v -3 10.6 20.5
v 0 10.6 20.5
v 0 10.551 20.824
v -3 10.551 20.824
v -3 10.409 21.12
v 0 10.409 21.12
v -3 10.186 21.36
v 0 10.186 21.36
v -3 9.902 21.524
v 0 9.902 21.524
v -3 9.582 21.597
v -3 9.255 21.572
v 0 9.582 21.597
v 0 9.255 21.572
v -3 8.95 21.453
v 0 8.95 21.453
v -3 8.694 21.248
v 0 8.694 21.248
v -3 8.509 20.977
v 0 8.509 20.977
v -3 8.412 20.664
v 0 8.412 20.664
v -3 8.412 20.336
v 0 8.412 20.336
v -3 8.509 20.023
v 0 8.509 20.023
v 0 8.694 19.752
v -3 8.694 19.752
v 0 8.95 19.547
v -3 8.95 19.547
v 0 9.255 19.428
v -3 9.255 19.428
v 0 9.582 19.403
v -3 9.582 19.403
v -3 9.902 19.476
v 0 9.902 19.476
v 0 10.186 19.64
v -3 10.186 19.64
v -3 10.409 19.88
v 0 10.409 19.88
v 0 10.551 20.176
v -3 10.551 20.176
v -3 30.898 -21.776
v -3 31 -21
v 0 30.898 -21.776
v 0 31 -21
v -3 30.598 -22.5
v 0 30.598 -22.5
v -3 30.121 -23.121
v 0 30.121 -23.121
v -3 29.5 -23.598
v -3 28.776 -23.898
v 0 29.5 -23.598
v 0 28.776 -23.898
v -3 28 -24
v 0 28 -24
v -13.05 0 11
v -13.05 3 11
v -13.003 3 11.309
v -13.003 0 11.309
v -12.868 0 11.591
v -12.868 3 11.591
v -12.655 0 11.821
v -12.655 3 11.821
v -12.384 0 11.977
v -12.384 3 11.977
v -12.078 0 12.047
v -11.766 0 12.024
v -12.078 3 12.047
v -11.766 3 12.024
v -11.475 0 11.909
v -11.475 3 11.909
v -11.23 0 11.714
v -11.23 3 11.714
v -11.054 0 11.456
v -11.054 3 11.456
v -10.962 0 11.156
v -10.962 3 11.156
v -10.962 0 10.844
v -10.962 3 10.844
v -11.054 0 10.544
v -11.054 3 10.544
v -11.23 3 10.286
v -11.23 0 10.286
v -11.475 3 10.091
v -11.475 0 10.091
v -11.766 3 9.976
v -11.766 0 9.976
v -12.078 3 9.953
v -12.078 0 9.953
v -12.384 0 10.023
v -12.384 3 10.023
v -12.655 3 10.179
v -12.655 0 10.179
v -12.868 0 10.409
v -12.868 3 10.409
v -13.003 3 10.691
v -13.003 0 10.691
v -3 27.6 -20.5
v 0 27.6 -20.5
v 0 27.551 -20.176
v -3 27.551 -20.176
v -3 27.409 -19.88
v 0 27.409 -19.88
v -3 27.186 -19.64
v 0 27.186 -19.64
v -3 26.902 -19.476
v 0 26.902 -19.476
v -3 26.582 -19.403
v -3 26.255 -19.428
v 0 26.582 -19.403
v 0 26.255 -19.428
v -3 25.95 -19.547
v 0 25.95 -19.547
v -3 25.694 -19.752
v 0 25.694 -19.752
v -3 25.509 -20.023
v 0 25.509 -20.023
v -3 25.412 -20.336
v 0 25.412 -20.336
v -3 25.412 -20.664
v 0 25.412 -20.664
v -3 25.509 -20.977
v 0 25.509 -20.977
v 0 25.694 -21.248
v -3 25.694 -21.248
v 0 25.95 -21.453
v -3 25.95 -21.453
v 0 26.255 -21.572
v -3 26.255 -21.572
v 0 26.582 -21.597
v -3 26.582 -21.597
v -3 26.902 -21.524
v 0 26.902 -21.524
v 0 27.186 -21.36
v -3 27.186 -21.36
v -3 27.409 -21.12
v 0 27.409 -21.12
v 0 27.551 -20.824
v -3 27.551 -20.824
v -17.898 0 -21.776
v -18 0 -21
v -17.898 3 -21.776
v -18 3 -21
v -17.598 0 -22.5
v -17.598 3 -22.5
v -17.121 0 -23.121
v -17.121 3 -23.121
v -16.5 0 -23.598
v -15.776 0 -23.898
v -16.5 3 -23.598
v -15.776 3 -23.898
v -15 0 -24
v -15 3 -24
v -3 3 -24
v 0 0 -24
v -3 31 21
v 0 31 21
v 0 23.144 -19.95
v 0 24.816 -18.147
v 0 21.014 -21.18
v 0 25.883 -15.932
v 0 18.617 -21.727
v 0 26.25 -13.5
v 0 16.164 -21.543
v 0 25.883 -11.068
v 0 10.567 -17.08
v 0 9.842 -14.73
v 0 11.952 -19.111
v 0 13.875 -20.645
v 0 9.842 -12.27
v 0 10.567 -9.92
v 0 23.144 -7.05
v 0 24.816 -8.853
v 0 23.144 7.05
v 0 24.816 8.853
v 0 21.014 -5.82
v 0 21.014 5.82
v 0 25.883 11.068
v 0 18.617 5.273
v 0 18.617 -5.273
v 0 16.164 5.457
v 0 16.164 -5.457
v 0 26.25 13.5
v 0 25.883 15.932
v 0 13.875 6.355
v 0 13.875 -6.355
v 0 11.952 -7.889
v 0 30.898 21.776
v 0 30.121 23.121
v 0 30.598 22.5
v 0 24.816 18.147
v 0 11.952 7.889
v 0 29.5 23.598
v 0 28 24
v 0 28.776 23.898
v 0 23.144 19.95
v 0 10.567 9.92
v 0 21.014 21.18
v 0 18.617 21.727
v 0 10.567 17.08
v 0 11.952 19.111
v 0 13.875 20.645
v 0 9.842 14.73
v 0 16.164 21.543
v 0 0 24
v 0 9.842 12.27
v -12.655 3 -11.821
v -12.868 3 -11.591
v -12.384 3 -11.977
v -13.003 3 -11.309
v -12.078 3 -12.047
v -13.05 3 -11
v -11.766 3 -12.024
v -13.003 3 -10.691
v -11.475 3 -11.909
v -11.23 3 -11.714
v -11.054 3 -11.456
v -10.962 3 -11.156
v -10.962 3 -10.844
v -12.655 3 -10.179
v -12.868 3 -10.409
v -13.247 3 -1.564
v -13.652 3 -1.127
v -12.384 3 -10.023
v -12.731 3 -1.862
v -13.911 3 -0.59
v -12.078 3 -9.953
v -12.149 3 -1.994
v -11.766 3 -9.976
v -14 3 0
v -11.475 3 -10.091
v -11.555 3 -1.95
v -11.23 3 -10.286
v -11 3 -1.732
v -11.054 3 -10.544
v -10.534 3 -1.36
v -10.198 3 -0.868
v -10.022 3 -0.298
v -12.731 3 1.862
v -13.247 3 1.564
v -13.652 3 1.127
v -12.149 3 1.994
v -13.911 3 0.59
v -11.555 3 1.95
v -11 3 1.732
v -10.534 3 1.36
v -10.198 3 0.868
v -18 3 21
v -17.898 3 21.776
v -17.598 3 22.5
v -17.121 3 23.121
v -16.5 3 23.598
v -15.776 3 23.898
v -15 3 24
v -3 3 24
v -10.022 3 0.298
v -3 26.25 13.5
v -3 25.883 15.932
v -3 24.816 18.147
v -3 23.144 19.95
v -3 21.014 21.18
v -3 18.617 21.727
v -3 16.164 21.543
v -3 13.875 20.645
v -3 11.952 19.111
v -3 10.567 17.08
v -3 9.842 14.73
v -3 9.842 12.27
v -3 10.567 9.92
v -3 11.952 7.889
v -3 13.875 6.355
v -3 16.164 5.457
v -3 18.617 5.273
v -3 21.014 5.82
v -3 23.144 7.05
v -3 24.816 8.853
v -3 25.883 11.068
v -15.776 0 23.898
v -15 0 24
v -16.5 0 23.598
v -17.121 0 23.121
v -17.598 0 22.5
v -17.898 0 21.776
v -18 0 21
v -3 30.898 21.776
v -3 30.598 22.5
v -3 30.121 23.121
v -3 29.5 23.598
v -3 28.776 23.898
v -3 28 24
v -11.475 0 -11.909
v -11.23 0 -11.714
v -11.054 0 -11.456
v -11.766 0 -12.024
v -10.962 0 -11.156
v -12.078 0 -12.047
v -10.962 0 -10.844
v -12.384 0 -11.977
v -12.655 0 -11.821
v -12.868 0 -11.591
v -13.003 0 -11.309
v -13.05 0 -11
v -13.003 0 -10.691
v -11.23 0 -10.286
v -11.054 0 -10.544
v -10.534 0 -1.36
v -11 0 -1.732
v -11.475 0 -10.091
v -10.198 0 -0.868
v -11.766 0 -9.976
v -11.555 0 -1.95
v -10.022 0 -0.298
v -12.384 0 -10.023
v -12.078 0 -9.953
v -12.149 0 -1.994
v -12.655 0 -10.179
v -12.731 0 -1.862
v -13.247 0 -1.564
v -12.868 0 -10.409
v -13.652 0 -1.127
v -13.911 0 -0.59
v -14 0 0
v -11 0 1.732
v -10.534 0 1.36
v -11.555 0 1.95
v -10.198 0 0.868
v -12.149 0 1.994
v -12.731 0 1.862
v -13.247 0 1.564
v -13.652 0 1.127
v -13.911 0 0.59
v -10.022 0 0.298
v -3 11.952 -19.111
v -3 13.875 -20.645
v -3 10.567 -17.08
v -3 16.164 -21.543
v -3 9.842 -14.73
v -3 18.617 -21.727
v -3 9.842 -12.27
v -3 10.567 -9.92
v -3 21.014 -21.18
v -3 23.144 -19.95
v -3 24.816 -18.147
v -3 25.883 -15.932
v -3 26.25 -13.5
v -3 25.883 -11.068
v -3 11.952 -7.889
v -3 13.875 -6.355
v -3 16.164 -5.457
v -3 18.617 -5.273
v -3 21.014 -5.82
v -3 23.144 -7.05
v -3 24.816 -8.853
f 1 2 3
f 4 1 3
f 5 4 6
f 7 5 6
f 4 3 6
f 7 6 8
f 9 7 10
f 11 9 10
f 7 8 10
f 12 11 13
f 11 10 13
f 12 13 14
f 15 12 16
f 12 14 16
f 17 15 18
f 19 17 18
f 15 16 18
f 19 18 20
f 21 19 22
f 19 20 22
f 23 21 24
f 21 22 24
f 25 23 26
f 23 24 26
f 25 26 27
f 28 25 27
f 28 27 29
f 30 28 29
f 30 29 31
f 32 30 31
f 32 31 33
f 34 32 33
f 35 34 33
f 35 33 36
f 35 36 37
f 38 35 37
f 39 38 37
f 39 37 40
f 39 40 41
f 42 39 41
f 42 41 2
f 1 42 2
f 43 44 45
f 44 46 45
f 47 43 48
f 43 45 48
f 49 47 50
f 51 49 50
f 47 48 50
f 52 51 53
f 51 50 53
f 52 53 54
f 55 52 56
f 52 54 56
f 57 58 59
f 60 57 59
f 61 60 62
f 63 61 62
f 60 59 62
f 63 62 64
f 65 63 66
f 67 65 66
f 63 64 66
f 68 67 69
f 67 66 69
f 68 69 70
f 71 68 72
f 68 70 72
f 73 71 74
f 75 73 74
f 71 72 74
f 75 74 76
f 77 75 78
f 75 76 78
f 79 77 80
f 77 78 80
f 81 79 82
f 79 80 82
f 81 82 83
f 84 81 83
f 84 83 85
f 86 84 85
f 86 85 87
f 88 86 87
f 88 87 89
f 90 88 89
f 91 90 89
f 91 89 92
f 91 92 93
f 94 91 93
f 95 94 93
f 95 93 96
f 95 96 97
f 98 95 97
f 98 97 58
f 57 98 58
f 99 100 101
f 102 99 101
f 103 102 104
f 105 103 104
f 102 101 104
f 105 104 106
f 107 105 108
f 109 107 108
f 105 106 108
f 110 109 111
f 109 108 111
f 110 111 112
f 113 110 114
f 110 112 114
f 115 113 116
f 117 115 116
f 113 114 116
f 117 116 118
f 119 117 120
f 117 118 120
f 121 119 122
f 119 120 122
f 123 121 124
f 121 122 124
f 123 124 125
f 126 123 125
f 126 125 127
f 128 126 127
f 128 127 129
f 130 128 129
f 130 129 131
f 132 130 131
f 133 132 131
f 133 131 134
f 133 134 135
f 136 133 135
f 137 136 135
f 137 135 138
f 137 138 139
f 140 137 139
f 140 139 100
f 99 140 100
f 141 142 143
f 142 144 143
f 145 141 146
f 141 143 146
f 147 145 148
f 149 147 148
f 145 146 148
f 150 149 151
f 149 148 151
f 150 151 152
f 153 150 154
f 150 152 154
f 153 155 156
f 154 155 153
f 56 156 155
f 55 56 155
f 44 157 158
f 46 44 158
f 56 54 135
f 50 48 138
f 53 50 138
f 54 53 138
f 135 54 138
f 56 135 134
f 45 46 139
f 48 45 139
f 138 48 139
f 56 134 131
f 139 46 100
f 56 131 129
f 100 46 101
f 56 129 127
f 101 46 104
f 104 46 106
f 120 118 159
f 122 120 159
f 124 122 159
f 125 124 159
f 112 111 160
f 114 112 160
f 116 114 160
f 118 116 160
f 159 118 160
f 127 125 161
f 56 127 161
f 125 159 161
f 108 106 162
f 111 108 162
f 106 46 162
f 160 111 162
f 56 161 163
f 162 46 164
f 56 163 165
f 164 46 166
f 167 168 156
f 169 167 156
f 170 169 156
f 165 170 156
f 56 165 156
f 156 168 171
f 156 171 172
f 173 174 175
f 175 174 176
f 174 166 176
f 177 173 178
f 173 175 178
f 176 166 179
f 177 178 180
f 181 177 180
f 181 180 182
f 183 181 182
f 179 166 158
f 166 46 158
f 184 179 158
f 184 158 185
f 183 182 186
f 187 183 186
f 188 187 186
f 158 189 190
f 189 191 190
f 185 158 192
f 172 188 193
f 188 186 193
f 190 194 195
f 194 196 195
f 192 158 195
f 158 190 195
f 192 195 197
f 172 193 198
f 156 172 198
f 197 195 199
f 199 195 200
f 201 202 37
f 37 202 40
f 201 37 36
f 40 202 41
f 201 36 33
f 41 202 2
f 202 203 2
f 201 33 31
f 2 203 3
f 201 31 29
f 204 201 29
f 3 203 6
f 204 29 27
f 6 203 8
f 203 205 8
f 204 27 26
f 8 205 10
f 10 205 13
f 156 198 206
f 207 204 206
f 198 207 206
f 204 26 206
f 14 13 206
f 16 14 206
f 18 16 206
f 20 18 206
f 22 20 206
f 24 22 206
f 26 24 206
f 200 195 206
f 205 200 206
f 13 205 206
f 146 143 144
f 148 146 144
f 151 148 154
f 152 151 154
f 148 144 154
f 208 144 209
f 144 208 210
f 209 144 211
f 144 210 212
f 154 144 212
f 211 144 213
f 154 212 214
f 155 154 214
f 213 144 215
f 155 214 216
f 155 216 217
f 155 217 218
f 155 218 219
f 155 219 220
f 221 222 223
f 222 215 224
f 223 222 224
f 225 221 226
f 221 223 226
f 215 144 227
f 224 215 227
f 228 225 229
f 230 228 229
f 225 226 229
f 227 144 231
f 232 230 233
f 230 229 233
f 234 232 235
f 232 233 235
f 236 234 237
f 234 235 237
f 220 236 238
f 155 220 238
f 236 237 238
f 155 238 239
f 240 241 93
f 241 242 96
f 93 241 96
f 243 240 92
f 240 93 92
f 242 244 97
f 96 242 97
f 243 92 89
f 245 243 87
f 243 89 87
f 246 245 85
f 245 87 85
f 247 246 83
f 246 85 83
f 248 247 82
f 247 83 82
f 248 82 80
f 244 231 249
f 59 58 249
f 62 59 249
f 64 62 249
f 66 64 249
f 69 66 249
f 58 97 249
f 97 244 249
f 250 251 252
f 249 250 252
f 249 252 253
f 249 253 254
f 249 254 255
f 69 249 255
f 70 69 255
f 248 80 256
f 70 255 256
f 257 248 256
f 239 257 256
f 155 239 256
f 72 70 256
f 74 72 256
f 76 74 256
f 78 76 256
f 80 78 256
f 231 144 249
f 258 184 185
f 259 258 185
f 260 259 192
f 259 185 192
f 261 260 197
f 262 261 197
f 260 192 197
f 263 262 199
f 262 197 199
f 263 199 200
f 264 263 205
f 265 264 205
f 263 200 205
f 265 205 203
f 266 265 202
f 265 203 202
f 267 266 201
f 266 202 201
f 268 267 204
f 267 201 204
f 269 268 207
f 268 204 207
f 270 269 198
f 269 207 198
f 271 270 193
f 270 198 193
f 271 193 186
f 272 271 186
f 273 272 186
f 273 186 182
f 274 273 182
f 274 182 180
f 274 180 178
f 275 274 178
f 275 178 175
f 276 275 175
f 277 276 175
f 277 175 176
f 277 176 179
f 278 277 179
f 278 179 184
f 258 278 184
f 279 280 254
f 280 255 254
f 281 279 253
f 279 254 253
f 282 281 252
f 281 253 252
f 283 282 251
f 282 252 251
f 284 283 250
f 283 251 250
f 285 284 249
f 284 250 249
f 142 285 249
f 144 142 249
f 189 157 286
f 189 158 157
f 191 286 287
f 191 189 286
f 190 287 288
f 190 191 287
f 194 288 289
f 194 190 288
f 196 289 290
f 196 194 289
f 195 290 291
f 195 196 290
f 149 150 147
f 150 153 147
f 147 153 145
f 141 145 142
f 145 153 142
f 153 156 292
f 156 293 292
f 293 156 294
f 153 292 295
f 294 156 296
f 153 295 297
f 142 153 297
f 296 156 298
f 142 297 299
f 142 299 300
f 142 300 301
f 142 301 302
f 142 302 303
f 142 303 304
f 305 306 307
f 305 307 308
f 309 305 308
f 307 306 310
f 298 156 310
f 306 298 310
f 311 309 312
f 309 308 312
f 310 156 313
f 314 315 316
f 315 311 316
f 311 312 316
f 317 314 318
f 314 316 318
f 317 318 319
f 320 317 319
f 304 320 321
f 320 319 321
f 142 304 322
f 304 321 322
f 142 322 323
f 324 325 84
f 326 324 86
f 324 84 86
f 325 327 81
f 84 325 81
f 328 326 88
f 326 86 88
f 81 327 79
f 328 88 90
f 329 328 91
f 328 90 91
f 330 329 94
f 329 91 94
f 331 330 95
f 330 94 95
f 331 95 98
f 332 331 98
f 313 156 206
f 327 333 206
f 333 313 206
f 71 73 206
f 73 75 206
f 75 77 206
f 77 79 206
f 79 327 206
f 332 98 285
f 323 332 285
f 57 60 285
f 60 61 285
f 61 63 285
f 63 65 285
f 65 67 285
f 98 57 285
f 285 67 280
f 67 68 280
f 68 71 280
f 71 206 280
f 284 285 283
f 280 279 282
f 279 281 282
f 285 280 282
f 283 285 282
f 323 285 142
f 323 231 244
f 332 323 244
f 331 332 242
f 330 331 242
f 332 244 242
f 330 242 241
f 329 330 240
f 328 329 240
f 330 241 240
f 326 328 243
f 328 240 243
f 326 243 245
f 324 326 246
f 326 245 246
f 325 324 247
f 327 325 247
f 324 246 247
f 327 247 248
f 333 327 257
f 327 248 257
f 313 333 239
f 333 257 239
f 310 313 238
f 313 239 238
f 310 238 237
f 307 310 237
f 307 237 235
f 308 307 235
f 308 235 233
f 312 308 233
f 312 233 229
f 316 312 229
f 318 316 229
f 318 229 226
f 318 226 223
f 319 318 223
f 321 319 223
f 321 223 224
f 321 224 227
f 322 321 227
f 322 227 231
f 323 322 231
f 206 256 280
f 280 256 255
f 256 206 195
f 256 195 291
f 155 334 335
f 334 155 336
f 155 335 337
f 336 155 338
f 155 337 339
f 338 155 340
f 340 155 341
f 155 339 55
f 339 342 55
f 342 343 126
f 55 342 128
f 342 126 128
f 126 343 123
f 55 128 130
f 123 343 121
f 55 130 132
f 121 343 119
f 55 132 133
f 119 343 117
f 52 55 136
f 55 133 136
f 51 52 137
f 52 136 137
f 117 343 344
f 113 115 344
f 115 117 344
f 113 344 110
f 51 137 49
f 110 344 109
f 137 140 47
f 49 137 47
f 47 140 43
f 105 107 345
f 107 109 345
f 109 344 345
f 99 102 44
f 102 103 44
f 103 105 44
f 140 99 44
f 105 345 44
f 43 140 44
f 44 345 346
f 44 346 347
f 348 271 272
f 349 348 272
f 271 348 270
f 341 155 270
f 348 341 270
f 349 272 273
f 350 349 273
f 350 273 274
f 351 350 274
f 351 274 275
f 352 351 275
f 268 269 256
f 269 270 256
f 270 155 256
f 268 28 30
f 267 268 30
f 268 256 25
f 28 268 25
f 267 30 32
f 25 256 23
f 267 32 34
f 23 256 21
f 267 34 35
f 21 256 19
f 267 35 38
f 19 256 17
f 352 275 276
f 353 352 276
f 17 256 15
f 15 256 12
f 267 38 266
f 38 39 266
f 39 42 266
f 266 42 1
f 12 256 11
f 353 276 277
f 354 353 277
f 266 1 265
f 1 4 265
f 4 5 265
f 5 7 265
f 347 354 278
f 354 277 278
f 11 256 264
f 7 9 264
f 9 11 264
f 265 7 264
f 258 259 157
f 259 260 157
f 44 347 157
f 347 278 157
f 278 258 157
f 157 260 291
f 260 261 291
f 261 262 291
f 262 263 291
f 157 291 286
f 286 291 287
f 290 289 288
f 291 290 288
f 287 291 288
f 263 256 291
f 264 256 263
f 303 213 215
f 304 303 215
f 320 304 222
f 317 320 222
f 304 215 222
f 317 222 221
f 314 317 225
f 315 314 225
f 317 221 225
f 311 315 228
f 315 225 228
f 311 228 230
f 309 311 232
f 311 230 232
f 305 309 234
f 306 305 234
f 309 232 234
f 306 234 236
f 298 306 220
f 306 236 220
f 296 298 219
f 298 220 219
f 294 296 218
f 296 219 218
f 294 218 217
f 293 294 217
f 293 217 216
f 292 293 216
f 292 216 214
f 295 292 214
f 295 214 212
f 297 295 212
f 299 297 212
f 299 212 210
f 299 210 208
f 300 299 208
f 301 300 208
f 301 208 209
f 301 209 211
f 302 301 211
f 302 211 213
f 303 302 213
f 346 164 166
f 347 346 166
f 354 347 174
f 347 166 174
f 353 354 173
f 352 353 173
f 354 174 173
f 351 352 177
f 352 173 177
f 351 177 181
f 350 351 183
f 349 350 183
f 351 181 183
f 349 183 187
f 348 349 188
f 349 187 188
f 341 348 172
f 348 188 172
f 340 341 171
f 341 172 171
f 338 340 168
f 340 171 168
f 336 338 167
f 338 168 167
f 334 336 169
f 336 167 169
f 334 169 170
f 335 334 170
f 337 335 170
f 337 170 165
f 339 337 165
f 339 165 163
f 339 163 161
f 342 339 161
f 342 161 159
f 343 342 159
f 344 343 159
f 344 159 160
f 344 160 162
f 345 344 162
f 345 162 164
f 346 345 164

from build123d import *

# Parameters (mm, degrees)
PAD_DEPTH       = 24
FILLET_R        = 3
SKETCH001_R     = 8.25
SKETCH001_R_2   = 1.1
POCKET_DEPTH    = 5
SKETCH002_R     = 1.05
SKETCH002_R_2   = 2
POCKET001_DEPTH = 5


with BuildPart() as part:
    # Sketch → Pad (new body, symmetric)
    with BuildSketch(Plane.XY):
        Polygon((-3, 31), (0, 31), (0, 0), (-18, 0), (-18, 3), (-3, 3), align=None)
    extrude(amount=PAD_DEPTH, both=True)

    # Fillet
    fillet_edges = [part.edges().sort_by_distance(p)[0] for p in [
        (-1.5, 31, 24),
        (-1.5, 31, -24),
        (-18, 1.5, -24),
        (-18, 1.5, 24),
    ]]
    fillet(fillet_edges, radius=FILLET_R)

    # Sketch001 (on Face5 of Fillet) → Pocket (cut)
    with BuildSketch(Plane.YZ):
        with Locations((18, 13.5)):
            Circle(SKETCH001_R)
        with Locations((18, -13.5)):
            Circle(SKETCH001_R)
        with Locations((9.5, 20.5)):
            Circle(SKETCH001_R_2)
        with Locations((26.5, -20.5)):
            Circle(SKETCH001_R_2)
    extrude(amount=-POCKET_DEPTH, mode=Mode.SUBTRACT)

    # Sketch002 (on Face8 of Pocket) → Pocket001 (cut)
    with BuildSketch(Plane(origin=(0, 3, 0), x_dir=(-1, 0, 0), z_dir=(0, 1, 0))):
        with Locations((12, 11)):
            Circle(SKETCH002_R)
        with Locations((12, -11)):
            Circle(SKETCH002_R)
        with Locations((12, 0)):
            Circle(SKETCH002_R_2)
    extrude(amount=-POCKET001_DEPTH, mode=Mode.SUBTRACT)


solid = part.part
